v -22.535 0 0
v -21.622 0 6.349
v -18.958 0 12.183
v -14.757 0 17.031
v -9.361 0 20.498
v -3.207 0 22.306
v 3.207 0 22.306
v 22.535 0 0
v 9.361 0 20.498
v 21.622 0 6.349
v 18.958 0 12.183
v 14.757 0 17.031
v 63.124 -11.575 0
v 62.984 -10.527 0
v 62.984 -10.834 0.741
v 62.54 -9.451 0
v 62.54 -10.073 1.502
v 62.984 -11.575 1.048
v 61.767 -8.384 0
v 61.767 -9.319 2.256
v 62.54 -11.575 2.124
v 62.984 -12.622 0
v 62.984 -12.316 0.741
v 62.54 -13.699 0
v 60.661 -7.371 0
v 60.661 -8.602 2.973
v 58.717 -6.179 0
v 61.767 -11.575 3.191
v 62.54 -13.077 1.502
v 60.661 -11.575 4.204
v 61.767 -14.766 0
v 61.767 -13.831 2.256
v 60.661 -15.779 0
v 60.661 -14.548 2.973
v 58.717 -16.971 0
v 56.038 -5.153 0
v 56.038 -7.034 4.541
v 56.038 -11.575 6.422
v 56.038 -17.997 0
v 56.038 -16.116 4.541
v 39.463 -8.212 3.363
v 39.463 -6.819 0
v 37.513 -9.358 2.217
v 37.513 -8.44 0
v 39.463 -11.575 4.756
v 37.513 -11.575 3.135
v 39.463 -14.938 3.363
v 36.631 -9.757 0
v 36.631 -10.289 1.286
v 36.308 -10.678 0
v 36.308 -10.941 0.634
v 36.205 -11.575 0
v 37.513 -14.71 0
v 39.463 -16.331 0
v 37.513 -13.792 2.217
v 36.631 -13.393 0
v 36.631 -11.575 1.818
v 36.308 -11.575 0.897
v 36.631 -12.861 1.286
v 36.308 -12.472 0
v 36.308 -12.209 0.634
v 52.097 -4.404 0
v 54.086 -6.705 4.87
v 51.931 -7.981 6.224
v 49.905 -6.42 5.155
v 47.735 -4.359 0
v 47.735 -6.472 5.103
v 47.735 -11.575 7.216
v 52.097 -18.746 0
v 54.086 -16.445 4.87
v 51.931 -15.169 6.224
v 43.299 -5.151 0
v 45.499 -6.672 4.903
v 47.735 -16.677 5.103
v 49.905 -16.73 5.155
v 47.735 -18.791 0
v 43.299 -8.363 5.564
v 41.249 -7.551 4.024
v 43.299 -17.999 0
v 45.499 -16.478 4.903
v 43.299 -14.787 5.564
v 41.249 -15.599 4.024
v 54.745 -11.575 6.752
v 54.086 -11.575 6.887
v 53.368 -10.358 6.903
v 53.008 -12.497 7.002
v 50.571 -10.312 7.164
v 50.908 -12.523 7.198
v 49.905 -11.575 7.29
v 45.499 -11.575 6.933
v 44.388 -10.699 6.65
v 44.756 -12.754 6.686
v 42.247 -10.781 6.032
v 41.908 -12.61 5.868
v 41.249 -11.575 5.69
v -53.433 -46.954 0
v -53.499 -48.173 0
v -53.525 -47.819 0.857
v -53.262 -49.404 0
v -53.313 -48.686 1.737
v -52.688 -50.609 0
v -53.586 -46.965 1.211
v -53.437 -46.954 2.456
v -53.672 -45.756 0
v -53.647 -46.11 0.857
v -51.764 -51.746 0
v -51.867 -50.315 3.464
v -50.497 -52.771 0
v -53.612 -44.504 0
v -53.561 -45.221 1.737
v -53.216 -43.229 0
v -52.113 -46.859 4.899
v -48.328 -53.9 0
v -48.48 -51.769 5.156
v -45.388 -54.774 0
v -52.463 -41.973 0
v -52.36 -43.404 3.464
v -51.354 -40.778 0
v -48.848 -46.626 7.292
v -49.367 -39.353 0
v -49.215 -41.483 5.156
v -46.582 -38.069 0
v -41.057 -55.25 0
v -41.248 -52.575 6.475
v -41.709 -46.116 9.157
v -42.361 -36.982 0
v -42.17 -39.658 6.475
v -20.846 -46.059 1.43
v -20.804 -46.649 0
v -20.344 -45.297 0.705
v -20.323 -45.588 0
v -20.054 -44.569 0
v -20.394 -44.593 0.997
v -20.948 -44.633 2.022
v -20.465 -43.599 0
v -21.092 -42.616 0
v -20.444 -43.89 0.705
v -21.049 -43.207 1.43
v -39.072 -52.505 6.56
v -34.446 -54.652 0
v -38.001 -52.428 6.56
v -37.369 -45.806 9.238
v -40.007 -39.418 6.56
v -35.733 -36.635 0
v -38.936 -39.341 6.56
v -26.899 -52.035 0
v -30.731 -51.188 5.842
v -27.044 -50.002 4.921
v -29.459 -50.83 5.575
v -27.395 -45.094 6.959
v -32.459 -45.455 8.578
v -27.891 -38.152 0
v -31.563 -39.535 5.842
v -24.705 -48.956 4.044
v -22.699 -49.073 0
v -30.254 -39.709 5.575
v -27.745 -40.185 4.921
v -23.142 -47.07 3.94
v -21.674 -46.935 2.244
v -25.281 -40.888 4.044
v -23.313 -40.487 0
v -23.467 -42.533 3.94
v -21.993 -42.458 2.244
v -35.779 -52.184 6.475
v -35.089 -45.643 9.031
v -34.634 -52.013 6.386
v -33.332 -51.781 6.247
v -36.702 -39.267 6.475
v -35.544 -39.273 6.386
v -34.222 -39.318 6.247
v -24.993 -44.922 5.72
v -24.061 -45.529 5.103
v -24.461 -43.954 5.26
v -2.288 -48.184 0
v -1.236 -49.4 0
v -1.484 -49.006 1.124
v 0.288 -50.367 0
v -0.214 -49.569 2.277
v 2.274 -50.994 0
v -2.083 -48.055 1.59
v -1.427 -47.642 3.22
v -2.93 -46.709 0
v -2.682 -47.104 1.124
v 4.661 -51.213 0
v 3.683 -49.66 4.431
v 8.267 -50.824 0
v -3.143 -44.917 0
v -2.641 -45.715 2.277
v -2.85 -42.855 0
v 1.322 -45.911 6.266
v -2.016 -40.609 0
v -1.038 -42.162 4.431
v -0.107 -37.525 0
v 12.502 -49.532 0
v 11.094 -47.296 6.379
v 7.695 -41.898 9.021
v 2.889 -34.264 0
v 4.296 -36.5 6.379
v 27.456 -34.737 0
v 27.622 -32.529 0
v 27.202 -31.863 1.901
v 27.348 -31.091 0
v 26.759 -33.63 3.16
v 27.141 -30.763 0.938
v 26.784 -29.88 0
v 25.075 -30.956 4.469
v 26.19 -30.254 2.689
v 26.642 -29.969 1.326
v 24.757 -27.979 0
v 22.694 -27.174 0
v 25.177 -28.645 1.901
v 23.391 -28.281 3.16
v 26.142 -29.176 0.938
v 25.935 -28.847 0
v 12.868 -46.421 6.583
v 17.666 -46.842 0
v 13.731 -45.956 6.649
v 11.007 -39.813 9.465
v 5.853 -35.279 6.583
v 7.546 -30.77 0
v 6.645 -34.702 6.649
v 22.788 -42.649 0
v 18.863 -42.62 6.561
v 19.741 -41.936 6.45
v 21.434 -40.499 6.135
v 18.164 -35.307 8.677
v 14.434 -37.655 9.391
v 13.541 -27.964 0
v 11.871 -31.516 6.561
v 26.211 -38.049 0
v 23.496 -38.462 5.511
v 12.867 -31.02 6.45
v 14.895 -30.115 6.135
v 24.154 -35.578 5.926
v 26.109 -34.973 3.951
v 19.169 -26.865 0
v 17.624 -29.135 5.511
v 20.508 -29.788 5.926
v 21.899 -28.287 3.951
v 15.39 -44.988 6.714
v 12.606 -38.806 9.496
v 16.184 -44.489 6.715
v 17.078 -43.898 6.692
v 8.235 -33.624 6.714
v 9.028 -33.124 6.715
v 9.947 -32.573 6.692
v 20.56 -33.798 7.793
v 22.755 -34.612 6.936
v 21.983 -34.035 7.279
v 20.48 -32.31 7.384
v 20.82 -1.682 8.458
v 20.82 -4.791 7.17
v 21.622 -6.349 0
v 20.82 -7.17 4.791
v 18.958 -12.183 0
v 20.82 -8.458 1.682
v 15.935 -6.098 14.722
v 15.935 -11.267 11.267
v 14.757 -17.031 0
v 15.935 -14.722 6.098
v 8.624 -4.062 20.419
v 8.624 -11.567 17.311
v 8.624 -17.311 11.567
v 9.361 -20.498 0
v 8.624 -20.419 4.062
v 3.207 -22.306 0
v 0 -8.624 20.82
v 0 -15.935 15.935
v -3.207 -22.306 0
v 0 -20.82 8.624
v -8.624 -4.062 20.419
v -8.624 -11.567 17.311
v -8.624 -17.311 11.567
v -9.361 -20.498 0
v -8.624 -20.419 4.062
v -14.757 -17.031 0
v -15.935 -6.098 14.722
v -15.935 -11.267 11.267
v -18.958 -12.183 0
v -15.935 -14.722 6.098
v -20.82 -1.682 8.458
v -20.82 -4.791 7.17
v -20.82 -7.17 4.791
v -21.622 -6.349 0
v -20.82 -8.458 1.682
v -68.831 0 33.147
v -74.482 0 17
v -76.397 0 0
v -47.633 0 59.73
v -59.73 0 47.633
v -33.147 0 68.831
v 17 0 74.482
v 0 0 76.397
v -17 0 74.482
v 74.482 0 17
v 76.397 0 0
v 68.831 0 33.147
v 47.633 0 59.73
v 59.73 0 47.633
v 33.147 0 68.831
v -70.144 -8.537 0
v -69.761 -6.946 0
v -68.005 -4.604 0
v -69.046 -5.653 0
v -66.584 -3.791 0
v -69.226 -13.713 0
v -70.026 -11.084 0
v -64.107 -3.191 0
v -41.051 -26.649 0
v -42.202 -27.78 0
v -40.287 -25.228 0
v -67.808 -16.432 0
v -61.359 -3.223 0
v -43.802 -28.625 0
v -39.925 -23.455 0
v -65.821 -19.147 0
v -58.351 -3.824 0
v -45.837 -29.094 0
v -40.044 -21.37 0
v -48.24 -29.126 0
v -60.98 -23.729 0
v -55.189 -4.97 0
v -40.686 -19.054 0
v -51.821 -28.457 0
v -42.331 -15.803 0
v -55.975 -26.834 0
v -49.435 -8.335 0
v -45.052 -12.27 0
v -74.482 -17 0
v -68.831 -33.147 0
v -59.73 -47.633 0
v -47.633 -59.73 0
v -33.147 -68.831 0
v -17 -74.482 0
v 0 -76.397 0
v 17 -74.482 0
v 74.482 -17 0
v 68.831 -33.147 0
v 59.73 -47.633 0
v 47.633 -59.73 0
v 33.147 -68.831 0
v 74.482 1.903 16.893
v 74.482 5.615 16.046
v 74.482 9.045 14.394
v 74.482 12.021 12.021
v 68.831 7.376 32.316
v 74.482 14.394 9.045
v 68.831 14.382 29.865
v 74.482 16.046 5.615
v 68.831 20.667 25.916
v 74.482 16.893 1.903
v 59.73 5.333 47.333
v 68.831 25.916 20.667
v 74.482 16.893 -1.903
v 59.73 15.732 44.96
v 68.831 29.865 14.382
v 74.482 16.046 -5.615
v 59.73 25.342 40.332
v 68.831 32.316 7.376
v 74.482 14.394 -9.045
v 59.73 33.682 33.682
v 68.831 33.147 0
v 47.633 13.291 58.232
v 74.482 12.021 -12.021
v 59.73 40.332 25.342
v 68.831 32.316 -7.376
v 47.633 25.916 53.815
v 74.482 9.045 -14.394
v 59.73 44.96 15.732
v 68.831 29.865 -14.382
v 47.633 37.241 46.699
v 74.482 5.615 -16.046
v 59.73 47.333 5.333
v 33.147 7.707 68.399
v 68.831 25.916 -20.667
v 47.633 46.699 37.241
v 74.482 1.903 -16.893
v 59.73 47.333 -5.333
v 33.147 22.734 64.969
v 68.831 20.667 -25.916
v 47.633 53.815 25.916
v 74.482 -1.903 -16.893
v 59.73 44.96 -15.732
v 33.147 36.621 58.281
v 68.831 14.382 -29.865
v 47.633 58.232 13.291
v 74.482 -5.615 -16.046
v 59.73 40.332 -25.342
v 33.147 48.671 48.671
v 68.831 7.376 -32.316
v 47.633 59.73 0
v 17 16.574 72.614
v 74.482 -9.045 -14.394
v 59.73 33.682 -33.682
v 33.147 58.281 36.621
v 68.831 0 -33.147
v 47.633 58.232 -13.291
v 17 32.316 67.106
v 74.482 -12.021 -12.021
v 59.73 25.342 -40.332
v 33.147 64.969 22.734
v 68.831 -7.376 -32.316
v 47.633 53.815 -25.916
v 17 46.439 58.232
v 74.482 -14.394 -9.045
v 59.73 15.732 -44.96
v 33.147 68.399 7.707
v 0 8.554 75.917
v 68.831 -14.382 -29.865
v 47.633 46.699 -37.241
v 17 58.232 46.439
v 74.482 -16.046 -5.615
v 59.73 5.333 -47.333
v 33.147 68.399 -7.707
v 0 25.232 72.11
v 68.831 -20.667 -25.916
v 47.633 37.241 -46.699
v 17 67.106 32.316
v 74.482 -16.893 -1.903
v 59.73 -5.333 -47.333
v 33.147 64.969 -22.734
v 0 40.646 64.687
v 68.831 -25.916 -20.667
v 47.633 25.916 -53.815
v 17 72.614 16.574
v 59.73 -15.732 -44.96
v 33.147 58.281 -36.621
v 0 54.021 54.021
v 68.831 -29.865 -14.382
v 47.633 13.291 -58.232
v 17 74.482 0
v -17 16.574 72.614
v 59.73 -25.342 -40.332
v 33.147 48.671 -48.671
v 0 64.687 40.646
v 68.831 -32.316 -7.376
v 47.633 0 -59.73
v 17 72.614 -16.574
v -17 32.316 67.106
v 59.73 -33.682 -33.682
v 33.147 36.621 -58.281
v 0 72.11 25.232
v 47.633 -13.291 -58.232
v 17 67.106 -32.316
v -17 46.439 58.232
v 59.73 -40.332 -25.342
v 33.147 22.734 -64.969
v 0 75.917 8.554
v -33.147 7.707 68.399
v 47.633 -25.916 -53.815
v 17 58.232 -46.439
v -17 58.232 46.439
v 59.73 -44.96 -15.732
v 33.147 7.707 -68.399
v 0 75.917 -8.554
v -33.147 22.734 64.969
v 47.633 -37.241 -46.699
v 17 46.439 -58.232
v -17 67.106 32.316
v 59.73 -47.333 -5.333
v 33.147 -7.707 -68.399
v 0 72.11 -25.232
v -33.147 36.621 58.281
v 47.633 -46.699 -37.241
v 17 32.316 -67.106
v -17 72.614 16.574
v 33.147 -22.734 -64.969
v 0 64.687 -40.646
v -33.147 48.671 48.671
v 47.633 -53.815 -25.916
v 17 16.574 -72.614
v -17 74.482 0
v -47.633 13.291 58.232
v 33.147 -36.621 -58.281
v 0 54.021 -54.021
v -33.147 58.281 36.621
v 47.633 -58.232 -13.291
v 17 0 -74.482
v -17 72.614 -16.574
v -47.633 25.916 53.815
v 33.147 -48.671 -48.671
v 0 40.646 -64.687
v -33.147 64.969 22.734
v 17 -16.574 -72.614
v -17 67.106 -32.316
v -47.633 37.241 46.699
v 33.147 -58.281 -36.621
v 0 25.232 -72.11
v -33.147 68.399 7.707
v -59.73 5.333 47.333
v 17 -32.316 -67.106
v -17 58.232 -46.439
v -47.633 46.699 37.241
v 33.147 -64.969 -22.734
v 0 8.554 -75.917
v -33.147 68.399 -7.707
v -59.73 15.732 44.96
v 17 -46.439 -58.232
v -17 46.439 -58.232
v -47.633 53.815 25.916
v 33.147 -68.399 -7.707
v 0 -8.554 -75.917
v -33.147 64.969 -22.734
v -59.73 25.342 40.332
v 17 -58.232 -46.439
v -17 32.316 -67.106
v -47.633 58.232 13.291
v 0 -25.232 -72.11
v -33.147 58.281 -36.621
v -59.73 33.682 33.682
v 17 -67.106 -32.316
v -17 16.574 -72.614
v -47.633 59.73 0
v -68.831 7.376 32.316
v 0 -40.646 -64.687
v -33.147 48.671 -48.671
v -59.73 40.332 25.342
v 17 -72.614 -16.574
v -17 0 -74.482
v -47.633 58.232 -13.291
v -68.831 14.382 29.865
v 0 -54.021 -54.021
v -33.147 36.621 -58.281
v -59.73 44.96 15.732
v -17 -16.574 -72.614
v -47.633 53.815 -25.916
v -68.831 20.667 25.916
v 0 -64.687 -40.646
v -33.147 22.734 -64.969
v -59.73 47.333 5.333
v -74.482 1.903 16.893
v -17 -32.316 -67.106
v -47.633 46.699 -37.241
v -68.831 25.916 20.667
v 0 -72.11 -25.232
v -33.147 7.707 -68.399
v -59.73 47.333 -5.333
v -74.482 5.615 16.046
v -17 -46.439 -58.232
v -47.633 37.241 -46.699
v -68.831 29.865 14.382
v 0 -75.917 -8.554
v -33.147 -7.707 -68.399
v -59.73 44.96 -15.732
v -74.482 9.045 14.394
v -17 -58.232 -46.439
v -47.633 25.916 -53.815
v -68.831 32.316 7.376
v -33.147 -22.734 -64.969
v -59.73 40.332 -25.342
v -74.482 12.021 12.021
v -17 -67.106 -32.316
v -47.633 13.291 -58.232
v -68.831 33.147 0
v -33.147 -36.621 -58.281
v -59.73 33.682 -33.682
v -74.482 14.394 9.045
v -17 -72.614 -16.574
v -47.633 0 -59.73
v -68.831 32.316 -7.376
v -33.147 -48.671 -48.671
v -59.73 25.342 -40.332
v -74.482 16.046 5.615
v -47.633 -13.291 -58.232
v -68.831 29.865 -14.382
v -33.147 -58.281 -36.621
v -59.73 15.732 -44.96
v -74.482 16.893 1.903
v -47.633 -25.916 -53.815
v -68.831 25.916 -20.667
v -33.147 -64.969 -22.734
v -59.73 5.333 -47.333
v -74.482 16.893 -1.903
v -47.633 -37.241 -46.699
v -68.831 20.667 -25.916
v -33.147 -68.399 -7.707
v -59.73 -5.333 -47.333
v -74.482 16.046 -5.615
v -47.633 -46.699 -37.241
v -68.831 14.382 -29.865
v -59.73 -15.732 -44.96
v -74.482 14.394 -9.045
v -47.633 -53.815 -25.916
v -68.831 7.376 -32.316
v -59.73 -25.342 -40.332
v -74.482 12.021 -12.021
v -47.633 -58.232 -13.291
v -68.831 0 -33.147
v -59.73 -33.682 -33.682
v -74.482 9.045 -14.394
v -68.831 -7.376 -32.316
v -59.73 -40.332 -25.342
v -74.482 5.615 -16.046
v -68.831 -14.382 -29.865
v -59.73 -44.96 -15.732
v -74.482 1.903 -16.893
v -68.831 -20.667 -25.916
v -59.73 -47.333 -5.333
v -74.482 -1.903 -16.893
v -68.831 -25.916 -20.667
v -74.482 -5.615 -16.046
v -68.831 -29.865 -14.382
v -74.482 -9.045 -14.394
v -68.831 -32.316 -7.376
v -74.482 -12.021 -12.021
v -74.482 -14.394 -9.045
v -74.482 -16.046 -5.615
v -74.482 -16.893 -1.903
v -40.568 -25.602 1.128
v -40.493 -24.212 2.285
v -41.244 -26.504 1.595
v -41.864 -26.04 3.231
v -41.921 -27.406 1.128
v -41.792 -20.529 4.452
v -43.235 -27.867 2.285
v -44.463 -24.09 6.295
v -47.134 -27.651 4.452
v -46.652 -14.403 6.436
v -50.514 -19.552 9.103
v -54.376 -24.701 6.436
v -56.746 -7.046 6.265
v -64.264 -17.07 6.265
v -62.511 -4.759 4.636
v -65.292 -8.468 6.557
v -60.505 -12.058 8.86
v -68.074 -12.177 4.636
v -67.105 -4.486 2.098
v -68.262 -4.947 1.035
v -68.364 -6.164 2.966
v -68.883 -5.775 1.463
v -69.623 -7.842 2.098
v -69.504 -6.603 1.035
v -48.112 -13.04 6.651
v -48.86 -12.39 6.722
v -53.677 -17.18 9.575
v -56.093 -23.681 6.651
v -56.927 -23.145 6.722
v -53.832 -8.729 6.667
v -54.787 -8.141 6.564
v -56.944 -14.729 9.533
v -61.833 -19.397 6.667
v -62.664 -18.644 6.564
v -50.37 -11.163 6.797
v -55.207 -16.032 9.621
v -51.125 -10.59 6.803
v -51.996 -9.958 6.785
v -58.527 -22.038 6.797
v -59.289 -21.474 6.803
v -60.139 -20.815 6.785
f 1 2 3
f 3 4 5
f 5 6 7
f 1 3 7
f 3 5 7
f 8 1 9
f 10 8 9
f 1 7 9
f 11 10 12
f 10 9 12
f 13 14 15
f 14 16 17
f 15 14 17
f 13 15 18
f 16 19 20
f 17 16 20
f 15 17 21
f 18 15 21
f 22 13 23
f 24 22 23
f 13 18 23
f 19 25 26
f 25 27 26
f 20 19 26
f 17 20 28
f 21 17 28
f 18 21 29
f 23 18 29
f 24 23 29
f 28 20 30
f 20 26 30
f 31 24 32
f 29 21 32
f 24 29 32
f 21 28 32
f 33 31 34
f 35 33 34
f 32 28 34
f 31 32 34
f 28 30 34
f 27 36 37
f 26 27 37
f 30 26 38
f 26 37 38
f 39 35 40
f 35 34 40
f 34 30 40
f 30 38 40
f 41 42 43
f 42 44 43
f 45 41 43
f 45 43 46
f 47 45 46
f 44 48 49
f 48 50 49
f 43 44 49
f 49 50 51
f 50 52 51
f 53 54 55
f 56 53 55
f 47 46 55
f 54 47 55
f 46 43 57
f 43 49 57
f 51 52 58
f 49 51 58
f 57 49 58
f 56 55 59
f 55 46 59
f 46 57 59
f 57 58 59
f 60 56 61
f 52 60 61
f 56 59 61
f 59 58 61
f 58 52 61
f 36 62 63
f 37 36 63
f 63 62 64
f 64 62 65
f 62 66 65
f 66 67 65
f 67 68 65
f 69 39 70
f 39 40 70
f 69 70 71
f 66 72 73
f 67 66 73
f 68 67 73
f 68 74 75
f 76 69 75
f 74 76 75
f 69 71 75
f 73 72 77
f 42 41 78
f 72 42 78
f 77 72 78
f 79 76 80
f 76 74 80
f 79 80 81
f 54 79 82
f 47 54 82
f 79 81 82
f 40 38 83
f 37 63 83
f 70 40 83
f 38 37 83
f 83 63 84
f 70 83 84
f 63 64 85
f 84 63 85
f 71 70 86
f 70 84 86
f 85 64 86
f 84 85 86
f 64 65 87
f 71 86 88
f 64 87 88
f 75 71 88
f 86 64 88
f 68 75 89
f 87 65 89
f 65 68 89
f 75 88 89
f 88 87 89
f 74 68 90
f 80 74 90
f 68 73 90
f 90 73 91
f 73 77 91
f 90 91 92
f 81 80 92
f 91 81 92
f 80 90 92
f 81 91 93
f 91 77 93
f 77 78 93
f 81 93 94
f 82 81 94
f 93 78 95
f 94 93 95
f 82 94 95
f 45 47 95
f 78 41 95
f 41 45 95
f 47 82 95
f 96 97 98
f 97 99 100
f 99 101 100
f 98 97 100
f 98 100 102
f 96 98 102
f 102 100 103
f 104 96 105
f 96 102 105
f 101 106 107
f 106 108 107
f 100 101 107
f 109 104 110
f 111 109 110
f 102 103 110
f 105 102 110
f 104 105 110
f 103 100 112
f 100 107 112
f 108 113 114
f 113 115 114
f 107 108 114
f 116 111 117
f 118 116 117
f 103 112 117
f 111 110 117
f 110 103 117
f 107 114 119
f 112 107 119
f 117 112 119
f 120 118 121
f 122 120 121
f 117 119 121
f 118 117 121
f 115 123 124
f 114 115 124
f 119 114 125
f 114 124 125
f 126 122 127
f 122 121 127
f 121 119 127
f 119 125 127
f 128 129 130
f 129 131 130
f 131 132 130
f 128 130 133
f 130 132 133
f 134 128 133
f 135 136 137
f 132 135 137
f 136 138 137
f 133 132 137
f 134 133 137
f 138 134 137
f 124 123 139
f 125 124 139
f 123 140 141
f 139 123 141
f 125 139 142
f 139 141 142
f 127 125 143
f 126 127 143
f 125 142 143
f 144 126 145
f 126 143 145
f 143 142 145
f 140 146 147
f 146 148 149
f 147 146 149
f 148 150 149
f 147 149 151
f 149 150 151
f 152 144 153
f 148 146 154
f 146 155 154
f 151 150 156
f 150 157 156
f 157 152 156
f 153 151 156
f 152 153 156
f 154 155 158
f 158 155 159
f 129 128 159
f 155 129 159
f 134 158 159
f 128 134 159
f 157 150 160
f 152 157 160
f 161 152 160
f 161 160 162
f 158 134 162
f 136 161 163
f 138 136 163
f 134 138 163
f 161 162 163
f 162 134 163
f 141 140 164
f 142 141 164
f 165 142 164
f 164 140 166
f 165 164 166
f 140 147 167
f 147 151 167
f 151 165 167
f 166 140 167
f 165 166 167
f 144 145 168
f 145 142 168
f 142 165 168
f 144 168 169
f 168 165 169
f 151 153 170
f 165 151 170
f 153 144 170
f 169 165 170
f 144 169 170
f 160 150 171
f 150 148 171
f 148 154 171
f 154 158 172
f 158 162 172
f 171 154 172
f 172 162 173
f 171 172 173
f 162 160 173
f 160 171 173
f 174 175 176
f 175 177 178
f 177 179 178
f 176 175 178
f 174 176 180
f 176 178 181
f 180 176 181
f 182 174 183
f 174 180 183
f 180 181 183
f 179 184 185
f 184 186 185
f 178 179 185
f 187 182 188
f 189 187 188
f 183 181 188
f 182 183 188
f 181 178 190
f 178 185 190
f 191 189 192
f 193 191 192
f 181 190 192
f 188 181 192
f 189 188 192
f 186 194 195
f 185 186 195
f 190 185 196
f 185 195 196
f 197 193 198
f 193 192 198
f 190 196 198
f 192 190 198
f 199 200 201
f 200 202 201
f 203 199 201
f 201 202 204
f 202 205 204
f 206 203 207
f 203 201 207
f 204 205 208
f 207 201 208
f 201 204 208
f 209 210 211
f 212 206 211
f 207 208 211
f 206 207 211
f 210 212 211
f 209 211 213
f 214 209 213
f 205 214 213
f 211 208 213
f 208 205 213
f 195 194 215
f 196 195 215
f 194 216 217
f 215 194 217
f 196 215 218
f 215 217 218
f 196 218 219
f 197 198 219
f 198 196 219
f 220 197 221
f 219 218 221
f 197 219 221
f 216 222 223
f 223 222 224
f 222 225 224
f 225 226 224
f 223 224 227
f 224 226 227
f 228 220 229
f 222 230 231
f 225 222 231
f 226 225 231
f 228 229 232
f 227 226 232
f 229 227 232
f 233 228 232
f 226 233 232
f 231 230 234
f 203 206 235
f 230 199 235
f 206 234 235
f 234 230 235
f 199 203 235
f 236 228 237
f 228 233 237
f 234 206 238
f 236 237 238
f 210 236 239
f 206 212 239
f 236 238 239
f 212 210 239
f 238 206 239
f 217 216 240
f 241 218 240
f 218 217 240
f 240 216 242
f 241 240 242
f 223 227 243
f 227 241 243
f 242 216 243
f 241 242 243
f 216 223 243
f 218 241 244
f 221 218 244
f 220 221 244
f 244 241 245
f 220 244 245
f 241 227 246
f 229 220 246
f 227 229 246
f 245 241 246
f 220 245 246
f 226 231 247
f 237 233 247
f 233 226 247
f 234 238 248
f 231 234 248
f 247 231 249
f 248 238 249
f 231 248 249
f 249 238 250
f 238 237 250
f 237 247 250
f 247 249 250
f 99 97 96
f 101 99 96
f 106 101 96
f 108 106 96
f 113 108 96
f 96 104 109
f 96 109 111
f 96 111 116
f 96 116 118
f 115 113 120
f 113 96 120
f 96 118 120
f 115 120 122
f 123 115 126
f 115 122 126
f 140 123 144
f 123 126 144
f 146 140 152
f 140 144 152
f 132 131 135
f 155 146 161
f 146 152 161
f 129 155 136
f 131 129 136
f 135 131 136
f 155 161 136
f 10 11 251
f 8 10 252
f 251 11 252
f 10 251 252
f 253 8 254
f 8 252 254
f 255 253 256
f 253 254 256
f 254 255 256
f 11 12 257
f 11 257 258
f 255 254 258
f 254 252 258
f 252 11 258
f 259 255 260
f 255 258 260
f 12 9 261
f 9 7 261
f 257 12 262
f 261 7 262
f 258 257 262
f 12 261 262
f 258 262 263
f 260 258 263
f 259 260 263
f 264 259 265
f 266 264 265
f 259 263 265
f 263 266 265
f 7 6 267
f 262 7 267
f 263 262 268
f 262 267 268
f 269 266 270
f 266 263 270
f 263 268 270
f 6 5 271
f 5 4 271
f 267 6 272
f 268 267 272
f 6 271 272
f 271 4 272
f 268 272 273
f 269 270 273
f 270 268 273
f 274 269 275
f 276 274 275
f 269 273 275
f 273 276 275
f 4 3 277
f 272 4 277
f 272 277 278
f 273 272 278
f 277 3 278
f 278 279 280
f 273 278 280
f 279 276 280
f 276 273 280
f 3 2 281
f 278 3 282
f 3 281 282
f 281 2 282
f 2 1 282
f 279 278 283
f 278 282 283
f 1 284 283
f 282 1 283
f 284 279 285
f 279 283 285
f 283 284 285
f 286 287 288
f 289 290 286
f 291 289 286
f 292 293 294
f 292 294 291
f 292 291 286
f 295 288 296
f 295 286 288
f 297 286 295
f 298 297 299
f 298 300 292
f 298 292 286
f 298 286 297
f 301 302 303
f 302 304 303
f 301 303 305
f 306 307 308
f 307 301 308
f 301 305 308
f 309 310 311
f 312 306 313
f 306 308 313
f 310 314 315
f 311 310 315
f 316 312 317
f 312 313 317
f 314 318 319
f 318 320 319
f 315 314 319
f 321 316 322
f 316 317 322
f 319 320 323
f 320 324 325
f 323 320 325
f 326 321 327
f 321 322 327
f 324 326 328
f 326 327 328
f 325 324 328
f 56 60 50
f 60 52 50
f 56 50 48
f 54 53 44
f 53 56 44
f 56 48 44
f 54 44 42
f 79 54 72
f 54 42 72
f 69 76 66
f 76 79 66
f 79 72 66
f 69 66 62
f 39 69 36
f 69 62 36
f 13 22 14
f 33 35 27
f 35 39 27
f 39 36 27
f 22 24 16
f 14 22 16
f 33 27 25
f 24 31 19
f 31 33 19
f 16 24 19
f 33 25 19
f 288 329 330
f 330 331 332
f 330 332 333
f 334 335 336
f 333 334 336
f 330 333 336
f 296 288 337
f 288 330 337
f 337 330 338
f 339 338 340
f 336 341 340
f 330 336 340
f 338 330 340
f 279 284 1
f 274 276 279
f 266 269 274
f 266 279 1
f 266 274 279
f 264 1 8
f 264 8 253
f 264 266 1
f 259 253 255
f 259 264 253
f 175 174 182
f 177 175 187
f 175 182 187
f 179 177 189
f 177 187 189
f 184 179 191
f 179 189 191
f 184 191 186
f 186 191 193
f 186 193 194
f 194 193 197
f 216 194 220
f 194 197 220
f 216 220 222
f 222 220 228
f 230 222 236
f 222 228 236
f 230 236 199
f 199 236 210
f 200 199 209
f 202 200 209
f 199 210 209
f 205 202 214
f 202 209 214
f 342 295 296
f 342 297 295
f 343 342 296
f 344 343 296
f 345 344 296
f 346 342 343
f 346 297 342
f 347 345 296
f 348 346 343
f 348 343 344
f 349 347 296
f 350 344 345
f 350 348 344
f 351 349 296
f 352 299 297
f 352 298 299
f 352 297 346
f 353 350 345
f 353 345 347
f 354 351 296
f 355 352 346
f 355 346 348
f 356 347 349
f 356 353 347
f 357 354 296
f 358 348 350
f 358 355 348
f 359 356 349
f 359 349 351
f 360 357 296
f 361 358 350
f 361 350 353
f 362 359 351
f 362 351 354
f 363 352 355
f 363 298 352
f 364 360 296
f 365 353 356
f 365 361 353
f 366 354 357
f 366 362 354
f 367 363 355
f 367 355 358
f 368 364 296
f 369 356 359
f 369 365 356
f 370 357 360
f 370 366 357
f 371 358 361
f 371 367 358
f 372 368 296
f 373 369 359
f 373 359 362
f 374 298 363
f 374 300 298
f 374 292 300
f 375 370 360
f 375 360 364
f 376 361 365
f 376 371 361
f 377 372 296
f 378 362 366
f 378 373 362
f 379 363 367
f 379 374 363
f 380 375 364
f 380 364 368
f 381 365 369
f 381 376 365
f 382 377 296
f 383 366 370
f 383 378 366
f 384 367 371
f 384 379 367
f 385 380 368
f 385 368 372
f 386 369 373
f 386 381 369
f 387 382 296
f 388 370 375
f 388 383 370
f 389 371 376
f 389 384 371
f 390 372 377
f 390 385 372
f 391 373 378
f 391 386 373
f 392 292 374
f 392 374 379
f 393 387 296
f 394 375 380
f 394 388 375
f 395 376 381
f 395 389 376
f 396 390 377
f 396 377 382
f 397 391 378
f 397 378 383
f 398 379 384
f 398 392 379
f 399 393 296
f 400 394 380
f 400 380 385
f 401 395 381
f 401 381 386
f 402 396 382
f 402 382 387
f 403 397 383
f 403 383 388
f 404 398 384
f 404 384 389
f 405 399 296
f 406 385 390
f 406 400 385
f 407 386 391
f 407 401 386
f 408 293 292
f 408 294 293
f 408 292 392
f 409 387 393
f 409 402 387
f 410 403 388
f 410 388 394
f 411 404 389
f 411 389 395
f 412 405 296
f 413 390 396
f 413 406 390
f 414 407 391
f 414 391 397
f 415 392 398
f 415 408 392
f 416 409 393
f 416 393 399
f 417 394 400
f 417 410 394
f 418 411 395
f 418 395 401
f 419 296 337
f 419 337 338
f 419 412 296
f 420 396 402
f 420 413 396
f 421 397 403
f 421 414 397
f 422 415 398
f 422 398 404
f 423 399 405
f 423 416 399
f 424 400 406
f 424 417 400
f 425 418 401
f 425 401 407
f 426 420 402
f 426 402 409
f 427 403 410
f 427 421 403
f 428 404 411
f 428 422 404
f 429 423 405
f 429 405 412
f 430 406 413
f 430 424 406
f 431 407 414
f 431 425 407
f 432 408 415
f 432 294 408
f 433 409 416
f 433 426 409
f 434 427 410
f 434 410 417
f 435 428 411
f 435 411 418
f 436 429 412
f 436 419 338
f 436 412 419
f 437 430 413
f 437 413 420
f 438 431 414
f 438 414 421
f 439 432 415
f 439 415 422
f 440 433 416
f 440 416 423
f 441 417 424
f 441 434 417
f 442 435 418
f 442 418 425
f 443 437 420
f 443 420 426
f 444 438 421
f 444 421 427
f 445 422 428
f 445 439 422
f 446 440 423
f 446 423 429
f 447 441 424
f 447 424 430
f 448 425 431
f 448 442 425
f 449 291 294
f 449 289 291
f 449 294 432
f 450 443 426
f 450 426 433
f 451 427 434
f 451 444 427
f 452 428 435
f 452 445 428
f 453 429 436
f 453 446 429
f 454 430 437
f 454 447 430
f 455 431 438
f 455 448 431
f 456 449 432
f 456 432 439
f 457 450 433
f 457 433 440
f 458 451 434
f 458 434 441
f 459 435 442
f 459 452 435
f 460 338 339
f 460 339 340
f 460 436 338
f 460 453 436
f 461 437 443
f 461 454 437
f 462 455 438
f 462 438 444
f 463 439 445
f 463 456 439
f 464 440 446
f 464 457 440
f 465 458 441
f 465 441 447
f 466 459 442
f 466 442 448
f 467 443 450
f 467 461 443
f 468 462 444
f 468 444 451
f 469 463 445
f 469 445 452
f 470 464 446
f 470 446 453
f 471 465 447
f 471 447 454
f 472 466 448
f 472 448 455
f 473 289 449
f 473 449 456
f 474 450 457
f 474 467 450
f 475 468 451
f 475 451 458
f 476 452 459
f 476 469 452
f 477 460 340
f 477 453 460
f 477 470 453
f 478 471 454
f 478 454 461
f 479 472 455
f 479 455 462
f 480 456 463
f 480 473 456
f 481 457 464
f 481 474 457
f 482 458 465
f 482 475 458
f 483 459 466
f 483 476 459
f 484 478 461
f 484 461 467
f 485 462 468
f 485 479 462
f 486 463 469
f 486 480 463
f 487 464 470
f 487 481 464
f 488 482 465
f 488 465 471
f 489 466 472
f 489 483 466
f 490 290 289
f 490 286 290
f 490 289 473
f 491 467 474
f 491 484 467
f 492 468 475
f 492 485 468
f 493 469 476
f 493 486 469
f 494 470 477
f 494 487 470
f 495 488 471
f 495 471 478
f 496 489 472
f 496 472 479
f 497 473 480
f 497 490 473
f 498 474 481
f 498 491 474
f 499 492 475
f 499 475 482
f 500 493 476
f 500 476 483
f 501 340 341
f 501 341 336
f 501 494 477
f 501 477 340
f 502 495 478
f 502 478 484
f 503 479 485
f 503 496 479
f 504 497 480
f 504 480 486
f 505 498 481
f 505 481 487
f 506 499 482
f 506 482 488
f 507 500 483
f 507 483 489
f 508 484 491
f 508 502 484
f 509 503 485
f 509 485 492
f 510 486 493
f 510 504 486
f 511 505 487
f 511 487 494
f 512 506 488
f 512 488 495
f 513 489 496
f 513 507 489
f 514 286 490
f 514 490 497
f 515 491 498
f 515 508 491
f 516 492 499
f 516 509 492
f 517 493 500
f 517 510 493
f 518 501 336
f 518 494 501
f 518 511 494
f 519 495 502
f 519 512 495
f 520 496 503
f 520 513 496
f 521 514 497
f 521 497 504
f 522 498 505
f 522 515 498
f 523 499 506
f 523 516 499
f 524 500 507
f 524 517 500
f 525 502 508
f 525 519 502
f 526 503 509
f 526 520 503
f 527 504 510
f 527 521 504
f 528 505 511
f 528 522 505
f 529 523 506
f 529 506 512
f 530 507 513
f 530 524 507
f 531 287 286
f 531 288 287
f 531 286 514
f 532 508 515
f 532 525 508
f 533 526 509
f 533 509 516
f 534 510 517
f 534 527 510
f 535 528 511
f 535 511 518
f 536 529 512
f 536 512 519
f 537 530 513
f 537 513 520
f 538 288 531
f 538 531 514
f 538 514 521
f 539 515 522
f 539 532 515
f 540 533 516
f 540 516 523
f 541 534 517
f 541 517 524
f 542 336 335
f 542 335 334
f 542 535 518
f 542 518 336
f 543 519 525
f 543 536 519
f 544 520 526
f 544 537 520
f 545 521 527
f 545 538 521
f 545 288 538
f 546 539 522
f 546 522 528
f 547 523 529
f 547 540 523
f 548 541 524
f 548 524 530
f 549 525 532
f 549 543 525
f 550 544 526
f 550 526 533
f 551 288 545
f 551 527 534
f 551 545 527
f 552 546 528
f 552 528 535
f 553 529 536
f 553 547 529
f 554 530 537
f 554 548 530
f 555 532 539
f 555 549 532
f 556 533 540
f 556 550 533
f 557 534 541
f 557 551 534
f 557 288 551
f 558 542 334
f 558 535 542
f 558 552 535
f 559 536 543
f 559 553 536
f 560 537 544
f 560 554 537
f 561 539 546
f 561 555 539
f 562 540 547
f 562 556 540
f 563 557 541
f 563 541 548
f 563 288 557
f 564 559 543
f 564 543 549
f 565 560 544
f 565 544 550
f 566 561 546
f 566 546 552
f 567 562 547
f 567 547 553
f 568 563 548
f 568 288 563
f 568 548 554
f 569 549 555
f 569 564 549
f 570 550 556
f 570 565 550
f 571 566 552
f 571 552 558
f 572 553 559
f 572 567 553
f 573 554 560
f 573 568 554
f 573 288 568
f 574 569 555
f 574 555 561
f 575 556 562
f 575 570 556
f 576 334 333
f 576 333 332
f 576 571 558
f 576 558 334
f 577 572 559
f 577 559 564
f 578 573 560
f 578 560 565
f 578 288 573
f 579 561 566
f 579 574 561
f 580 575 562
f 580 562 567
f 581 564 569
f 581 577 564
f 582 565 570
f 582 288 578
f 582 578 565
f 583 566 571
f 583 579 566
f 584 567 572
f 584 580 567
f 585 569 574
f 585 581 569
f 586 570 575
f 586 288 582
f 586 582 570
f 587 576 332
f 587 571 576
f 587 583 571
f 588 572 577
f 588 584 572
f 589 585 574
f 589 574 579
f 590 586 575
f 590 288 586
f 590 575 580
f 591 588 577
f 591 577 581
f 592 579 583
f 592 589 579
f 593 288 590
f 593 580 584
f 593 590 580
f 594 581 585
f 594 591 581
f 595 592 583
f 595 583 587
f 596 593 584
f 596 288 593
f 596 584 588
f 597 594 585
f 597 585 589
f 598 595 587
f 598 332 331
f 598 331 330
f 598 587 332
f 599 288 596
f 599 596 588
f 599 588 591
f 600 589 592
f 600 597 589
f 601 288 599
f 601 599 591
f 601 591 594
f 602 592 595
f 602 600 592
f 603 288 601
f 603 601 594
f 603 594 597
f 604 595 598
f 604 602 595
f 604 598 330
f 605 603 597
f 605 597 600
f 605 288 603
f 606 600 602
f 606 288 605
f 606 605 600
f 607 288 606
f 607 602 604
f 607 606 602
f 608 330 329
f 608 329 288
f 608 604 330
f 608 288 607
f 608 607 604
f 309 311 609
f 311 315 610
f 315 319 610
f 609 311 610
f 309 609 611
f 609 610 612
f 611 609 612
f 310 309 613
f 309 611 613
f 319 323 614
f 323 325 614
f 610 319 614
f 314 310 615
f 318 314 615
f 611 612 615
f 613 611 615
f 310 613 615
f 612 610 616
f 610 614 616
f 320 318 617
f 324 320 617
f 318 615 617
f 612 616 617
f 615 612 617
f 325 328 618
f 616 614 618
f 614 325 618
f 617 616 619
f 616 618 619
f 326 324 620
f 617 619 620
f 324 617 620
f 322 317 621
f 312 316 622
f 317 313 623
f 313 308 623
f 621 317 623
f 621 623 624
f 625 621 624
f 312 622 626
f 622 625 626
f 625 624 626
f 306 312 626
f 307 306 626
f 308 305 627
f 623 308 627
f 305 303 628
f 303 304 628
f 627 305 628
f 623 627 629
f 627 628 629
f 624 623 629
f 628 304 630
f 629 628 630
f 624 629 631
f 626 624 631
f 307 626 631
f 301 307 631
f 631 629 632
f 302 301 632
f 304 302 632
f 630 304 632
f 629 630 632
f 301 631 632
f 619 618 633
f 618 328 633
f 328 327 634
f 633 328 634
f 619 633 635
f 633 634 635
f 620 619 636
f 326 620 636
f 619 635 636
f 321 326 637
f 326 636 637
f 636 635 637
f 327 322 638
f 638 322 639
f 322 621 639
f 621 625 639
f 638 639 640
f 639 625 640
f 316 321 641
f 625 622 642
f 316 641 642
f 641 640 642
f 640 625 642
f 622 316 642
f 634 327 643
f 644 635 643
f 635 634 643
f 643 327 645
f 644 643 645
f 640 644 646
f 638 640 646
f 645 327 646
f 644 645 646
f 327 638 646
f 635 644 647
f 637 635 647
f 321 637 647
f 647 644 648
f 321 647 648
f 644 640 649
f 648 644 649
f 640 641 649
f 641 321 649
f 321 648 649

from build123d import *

# Parameters (mm, degrees)
F1_ANGLE = 270
F3_ANGLE = 90
F5_ANGLE = 180
F6_ANGLE = 180
F7_ANGLE = 180
F8_ANGLE = 180


with BuildPart() as f1:
    # F0 (on Front) → F1 (revolve)
    with BuildSketch(Plane.XZ):
        with BuildLine():
            Line((-76.3971819477, 0), (76.3971819477, 0))
            ThreePointArc((76.3971819477, 0), (0, 76.3971819477), (-76.3971819477, 0))
        make_face()
    revolve(axis=Axis((0, 0, 0), (-1, 0, 0)), revolution_arc=F1_ANGLE)


with BuildPart() as f3:
    # F2 (on face) → F3 (revolve)
    with BuildSketch(Plane.XZ):
        with BuildLine():
            Line((-22.5348739836, 0), (22.5348739836, 0))
            ThreePointArc((22.5348739836, 0), (0, 22.5348739836), (-22.5348739836, 0))
        make_face()
    revolve(axis=Axis((0, 0, 0), (1, 0, 0)), revolution_arc=F3_ANGLE)


with BuildPart() as f5:
    # F4 (on face) → F5 (revolve)
    with BuildSketch(Plane.XY):
        with BuildLine():
            Line((-69.0458789468, -5.6528784335), (-41.0506650805, -26.6492851079))
            add(Edge.make_bspline(
                [(-41.0506650805, -26.6492851079), (-35.2778521439, -18.9521998266), (-49.275459077, -8.4539964894), (-63.2730660101, 2.0442068477), (-69.0458789468, -5.6528784335)],
                knots=[0, 0, 0, 1.5707963268, 1.5707963268, 3.1415926536, 3.1415926536, 3.1415926536], degree=2, weights=[1, 0.7071067812, 1, 0.7071067812, 1]))
        make_face()
    revolve(axis=Axis((-55.0482720137, -16.1510817707, 0), (0.8000000511, -0.5999999319, 0)), revolution_arc=F5_ANGLE)


with BuildPart() as f6:
    # F4 (on face) → F6 (revolve)
    with BuildSketch(Plane.XY):
        with BuildLine():
            Line((-20.0542602688, -44.5691755388), (-53.4331630915, -46.9536224034))
            add(Edge.make_bspline(
                [(-53.4331630915, -46.9536224034), (-55.03384642, -56.3739927701), (-38.3443950087, -55.1817693378), (-21.6549435973, -53.9895459055), (-20.0542602688, -44.5691755388)],
                knots=[2.9503578275, 2.9503578275, 2.9503578275, 4.5211541543, 4.5211541543, 6.0919504811, 6.0919504811, 6.0919504811], degree=2, weights=[1, 0.7071067812, 1, 0.7071067812, 1]))
        make_face()
    revolve(axis=Axis((-36.7437116802, -45.7613989711, 0), (-0.9974581911, -0.0712541712, 0)), revolution_arc=F6_ANGLE)


with BuildPart() as f7:
    # F4 (on face) → F7 (revolve)
    with BuildSketch(Plane.XY):
        with BuildLine():
            Line((26.7838705331, -29.8795029521), (-2.2880677134, -48.1840595603))
            add(Edge.make_bspline(
                [(-2.2880677134, -48.1840595603), (2.7733286279, -56.2227465946), (17.3092977511, -47.0704682905), (31.8452668744, -37.9181899864), (26.7838705331, -29.8795029521)],
                knots=[0, 0, 0, 1.5707963268, 1.5707963268, 3.1415926536, 3.1415926536, 3.1415926536], degree=2, weights=[1, 0.7071067812, 1, 0.7071067812, 1]))
        make_face()
    revolve(axis=Axis((12.2479014099, -39.0317812562, 0), (-0.8462328021, -0.5328133301, 0)), revolution_arc=F7_ANGLE)


with BuildPart() as f8:
    # F4 (on face) → F8 (revolve)
    with BuildSketch(Plane.XY):
        with BuildLine():
            Line((36.2053401768, -11.5749426186), (63.1238110363, -11.5749426186))
            add(Edge.make_bspline(
                [(63.1238110363, -11.5749426186), (63.1238110363, -4.2835854489), (49.6645756066, -4.2835854489), (36.2053401768, -4.2835854489), (36.2053401768, -11.5749426186)],
                knots=[3.1415926536, 3.1415926536, 3.1415926536, 4.7123889804, 4.7123889804, 6.2831853072, 6.2831853072, 6.2831853072], degree=2, weights=[1, 0.7071067812, 1, 0.7071067812, 1]))
        make_face()
    revolve(axis=Axis((49.6645756066, -11.5749426186, 0), (1, 0, 0)), revolution_arc=F8_ANGLE)


solid = Compound([f1.part, f3.part, f5.part, f6.part, f7.part, f8.part])
